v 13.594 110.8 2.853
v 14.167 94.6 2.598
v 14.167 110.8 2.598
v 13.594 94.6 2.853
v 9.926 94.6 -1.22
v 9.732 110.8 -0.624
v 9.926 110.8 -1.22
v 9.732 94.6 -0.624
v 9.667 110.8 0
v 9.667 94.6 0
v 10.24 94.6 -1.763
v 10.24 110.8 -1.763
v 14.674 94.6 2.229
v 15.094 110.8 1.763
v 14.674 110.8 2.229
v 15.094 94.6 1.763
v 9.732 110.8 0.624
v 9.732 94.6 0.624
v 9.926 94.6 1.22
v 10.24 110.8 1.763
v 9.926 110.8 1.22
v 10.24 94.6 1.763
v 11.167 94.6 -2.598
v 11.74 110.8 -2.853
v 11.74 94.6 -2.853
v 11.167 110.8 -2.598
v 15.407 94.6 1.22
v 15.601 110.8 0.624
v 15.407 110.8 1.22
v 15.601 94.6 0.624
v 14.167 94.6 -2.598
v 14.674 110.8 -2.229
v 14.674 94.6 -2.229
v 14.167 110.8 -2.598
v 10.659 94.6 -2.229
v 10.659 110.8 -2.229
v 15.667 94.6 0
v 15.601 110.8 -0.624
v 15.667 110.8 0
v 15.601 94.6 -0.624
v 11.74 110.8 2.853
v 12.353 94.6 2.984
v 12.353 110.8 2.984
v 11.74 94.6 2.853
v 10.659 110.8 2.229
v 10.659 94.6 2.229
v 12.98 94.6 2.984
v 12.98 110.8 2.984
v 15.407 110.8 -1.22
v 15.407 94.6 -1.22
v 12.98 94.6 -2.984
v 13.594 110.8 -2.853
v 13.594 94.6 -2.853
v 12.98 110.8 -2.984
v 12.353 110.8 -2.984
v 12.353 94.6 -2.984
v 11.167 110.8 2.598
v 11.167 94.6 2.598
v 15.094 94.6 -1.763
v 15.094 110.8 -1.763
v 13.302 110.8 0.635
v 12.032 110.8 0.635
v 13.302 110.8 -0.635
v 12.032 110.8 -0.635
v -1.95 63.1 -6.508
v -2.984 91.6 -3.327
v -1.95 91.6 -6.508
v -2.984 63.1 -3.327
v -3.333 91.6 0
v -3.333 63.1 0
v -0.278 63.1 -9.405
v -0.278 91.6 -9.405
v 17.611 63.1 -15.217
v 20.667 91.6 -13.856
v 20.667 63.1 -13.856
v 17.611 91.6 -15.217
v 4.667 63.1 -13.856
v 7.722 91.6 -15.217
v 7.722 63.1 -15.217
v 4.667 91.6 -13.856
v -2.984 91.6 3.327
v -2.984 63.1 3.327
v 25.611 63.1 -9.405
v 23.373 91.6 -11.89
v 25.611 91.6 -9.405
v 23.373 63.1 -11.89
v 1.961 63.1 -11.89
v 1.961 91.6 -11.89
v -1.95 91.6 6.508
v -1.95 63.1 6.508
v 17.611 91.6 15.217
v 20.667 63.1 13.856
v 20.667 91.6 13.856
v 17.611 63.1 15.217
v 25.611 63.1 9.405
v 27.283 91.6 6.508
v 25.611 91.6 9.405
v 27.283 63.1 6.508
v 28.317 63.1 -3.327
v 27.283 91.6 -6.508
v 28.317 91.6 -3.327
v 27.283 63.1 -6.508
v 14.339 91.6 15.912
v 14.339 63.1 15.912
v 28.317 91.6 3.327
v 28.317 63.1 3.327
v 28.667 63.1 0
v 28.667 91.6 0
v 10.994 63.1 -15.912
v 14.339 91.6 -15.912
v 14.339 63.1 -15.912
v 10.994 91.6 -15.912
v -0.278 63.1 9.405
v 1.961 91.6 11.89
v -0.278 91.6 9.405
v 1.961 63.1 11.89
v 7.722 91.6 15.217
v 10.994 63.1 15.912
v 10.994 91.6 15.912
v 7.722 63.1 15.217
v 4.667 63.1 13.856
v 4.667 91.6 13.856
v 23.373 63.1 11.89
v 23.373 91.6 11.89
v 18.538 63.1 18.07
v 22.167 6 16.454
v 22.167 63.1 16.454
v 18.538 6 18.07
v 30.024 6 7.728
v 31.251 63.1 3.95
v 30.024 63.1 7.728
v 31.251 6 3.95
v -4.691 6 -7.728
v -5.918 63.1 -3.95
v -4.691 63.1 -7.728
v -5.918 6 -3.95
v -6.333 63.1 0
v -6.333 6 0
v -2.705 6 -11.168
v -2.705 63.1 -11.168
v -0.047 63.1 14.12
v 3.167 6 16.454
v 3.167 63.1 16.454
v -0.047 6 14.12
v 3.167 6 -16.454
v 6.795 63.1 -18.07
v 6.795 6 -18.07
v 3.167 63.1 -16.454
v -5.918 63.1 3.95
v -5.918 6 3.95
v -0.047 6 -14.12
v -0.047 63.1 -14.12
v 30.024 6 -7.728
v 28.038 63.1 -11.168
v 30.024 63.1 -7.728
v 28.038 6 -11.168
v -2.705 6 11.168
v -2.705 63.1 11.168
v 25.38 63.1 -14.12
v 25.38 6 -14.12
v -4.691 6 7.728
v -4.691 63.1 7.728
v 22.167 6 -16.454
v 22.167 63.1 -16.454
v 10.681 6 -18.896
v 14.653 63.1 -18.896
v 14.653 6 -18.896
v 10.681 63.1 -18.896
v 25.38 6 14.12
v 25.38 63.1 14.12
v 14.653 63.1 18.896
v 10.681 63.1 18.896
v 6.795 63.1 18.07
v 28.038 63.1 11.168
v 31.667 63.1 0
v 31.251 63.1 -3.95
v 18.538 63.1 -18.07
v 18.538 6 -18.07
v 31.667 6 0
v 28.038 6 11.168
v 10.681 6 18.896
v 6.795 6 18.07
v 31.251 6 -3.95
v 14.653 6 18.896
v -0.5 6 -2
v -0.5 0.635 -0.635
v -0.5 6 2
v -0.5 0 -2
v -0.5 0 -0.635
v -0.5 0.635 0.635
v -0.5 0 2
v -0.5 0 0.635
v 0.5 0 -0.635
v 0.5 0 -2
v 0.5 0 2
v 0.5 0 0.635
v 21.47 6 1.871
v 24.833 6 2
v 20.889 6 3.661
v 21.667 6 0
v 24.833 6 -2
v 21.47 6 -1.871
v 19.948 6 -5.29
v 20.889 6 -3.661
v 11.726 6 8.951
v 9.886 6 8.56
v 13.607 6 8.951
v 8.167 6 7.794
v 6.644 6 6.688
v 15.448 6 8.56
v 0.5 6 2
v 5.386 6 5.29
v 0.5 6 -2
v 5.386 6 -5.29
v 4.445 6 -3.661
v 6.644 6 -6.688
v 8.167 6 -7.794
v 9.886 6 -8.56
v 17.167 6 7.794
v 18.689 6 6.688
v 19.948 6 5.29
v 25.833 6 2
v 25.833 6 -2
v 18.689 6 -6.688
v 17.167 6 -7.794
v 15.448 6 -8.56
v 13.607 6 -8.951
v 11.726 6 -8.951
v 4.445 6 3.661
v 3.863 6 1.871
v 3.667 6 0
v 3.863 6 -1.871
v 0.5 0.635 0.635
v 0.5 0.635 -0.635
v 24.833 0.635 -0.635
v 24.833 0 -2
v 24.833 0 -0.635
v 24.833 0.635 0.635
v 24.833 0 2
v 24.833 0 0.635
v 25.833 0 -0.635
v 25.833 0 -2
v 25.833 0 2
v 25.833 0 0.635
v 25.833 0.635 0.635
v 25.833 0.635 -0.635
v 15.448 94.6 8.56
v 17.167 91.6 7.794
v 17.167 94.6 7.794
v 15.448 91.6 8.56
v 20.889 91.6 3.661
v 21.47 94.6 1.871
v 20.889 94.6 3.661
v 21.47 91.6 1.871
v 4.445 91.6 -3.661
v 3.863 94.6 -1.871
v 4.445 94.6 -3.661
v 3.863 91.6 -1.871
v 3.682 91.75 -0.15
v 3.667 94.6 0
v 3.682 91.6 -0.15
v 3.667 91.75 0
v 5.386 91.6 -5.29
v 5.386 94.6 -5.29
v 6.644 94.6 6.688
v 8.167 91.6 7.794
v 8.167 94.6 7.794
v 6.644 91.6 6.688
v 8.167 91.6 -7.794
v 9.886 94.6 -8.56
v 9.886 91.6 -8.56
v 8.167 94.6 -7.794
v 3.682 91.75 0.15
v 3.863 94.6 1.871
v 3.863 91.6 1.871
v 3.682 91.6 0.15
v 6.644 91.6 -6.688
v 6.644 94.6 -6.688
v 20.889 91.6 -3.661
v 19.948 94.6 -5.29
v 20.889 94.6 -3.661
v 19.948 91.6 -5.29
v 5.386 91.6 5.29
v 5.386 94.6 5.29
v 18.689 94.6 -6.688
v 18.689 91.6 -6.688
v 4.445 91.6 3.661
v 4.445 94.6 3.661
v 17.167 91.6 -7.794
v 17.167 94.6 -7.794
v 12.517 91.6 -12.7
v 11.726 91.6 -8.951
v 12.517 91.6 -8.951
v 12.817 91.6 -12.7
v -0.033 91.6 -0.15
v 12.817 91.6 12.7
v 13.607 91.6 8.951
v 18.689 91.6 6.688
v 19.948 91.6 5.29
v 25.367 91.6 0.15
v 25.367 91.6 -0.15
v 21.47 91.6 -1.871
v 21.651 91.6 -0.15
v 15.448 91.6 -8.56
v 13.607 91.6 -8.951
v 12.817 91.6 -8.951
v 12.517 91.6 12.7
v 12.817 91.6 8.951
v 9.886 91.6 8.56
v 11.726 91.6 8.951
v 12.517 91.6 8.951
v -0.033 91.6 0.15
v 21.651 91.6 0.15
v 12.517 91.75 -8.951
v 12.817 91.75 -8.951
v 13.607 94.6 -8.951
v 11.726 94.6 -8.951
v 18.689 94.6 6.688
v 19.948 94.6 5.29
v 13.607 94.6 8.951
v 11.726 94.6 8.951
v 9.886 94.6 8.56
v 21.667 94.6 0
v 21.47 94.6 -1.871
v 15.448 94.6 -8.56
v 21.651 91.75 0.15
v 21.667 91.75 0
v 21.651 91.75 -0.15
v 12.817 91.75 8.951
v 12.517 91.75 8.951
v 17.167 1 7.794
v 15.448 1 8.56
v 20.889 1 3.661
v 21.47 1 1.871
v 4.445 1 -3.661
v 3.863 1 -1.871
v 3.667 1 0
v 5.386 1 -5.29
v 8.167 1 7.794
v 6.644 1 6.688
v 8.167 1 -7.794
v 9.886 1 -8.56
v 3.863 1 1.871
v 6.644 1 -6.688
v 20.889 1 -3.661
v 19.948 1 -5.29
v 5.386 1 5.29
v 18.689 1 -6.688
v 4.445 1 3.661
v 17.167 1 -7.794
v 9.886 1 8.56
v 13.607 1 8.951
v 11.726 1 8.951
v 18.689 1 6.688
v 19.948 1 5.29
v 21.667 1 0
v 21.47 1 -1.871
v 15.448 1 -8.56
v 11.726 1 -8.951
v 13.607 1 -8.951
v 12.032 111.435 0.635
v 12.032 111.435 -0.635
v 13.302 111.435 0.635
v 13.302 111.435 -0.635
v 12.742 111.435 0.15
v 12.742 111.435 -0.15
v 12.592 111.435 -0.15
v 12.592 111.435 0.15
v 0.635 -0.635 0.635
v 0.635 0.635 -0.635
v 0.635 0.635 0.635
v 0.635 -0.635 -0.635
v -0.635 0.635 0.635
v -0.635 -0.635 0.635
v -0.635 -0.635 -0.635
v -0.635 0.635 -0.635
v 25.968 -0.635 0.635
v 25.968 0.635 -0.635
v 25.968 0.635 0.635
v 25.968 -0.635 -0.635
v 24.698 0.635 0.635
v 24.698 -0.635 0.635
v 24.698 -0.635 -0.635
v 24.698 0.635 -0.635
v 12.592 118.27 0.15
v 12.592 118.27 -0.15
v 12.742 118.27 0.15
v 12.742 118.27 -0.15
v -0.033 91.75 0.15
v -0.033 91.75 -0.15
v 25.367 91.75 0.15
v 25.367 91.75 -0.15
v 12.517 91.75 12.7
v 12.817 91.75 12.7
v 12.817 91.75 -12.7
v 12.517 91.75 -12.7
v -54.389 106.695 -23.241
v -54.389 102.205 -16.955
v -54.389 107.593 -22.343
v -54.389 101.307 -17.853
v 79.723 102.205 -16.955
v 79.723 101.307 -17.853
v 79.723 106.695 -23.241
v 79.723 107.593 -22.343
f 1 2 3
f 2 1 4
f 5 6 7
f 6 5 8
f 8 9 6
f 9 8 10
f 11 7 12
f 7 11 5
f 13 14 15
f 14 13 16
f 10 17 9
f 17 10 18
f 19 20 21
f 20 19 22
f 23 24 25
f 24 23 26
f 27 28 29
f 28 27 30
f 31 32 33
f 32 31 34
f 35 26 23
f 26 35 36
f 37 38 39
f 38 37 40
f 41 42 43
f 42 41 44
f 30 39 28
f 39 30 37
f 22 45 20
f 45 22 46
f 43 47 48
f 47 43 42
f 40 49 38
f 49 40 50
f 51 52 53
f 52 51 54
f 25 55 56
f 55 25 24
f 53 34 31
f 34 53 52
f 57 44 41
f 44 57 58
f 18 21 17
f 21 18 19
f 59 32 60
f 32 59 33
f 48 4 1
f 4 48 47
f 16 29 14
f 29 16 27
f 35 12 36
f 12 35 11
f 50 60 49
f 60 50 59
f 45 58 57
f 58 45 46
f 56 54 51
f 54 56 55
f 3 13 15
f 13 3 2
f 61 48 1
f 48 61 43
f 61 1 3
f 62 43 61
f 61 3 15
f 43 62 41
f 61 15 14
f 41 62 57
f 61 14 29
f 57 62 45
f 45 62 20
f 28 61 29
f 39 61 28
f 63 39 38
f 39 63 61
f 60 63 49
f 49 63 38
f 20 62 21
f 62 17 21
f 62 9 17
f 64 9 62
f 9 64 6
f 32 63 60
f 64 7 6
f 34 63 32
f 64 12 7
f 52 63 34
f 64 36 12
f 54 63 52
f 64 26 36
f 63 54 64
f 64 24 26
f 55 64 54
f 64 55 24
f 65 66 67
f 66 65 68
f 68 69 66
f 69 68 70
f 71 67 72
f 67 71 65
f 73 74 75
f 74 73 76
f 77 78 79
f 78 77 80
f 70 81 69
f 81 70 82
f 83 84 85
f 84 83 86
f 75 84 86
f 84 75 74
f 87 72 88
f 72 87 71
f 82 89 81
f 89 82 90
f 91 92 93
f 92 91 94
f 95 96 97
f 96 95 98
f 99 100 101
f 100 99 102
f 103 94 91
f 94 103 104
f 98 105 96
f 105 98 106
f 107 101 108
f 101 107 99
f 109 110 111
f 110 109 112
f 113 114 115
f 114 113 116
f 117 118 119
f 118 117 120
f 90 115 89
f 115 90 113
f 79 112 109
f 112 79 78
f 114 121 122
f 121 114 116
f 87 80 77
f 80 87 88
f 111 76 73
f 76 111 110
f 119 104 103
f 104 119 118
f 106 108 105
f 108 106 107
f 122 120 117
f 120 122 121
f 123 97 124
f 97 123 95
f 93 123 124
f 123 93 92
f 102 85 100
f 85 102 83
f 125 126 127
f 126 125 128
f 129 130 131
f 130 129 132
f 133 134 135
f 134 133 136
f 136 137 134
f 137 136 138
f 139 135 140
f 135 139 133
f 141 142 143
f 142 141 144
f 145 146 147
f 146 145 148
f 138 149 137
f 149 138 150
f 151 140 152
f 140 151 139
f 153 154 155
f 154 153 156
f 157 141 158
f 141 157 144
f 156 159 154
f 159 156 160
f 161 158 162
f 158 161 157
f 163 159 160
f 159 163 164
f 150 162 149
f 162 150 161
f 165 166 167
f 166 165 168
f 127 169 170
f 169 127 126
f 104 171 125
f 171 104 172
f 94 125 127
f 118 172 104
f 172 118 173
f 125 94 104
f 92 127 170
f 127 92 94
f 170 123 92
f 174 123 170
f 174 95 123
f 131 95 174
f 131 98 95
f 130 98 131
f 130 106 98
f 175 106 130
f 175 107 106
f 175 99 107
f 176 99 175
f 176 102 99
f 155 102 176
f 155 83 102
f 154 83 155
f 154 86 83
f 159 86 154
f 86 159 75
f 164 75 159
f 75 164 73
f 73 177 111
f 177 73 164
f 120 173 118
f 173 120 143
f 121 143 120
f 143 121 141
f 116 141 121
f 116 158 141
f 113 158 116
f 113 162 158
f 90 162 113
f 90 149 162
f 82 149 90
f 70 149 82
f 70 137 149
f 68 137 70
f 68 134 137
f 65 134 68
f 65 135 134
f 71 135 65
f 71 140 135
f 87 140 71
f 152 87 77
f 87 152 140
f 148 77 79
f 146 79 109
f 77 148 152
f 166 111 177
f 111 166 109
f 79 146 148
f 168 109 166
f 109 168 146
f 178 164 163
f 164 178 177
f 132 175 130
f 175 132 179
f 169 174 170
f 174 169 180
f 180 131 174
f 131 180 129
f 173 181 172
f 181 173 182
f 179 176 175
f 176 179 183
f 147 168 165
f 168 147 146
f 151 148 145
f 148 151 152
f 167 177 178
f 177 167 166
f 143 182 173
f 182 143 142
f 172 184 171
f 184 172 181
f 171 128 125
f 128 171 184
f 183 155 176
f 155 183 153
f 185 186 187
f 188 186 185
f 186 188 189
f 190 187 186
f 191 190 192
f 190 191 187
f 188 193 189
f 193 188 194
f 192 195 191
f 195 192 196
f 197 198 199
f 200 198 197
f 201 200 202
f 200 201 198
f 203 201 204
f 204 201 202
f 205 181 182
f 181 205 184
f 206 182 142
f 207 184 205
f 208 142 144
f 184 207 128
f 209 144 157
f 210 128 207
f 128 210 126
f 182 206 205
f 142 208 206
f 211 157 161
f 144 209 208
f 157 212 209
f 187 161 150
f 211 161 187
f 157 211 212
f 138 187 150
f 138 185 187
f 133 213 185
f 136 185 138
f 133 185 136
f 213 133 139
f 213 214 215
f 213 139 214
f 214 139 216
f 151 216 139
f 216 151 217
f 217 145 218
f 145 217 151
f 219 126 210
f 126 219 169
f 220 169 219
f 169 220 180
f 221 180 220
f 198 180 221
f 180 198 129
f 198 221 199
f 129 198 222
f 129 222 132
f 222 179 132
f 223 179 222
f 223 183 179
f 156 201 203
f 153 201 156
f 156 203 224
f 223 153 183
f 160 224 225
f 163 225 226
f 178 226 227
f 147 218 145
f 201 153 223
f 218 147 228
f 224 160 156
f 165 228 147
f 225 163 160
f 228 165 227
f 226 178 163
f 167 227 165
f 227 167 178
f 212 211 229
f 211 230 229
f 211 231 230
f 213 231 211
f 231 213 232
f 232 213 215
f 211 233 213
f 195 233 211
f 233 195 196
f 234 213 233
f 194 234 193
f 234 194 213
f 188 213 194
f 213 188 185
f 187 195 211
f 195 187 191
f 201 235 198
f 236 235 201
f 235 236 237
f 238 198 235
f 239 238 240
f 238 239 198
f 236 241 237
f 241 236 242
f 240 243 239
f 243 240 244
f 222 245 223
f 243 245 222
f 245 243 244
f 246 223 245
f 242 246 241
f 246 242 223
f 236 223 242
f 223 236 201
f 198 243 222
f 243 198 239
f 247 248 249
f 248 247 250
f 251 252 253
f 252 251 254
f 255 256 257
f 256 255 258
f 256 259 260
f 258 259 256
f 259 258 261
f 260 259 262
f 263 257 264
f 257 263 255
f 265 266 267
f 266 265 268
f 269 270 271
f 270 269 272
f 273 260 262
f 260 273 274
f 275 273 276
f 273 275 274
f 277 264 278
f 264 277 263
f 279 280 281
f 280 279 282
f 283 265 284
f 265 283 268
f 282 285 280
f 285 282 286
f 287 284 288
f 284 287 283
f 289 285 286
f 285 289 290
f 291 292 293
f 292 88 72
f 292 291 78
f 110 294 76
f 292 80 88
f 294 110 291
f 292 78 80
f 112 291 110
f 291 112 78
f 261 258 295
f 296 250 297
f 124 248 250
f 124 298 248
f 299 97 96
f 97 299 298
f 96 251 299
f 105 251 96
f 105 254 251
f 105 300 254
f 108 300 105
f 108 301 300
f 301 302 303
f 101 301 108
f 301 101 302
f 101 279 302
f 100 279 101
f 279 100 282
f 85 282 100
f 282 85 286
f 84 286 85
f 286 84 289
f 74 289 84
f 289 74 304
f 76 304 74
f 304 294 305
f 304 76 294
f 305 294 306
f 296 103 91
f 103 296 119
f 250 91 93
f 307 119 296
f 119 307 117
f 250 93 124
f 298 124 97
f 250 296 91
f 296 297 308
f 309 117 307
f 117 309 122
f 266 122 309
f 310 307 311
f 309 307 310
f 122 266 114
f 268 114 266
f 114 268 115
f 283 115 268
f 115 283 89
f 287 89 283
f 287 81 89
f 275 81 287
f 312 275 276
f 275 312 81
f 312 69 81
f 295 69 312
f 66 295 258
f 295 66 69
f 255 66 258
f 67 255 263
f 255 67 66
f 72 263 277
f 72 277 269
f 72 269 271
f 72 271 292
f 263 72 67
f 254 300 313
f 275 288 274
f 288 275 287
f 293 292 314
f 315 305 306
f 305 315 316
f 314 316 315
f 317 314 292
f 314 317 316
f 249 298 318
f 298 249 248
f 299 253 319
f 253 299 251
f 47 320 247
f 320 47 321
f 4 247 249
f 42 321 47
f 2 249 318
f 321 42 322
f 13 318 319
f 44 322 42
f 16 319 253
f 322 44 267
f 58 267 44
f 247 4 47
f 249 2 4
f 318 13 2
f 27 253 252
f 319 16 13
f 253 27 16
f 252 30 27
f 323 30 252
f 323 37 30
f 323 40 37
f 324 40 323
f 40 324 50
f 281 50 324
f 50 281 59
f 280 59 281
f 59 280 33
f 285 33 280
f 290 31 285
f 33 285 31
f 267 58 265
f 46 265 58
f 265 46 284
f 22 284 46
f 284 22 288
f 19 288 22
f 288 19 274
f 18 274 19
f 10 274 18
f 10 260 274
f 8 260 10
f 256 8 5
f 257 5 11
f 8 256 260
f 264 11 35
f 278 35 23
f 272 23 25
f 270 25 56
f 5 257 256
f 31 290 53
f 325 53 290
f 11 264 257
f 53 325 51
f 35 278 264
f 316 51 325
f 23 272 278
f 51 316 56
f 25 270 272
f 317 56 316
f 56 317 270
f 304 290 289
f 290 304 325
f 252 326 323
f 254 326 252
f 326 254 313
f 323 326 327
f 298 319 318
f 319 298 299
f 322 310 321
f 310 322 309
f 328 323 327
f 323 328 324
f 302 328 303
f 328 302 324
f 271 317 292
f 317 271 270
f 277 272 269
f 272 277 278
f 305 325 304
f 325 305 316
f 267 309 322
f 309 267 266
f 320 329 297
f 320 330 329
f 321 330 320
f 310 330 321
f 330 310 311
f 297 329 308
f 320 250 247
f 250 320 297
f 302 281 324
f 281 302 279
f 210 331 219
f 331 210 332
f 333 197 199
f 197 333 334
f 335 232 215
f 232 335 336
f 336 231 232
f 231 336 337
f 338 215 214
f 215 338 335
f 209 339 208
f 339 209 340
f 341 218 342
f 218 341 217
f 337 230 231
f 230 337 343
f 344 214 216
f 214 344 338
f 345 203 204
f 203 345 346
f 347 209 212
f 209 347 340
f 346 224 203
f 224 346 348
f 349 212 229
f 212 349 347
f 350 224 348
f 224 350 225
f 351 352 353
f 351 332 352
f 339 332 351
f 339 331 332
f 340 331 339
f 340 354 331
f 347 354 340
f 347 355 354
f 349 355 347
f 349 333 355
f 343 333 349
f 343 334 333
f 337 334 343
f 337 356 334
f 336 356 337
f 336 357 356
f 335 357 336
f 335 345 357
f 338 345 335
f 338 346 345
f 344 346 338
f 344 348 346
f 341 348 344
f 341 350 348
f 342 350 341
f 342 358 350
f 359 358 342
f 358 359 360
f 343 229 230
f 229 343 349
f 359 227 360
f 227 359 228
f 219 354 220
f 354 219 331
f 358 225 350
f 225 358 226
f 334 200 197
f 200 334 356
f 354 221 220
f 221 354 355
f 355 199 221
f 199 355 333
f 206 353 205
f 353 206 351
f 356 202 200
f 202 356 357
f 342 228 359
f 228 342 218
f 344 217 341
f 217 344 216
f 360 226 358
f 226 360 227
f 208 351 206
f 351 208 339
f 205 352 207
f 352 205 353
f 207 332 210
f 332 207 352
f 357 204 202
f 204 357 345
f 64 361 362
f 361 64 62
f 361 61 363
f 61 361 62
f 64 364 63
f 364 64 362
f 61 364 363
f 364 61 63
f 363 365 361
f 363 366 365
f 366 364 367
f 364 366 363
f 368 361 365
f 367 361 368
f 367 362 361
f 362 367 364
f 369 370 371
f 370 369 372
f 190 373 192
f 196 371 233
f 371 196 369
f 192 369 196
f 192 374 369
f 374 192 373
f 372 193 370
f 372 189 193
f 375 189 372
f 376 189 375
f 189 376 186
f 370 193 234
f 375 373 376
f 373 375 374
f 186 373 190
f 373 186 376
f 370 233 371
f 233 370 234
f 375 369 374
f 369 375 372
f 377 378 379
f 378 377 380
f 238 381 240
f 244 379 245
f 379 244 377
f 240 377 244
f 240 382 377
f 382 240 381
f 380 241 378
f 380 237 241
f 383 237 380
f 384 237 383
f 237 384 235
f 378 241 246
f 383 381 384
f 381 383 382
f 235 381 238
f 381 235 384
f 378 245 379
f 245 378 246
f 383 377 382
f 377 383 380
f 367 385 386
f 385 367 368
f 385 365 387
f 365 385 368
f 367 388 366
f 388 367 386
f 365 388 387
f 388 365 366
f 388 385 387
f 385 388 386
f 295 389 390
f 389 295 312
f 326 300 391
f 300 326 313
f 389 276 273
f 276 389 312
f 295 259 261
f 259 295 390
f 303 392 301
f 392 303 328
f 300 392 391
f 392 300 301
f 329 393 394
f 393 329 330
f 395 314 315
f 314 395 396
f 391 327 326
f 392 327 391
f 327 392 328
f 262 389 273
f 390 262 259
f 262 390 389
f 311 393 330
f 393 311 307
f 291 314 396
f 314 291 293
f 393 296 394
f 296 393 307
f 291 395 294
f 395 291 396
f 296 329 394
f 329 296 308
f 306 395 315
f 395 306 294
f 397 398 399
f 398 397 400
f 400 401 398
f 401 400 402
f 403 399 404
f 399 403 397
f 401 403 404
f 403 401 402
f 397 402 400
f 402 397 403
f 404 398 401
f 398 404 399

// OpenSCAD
include <../mo/mo.scad>

motorShaftDepth = 19.2;
motorShaftDiameter = 6;
motorGearShoulderDepth = 3;
motorGearShoulderDiameter = 18;
motorGearCapDepth = 4;
motorGearCapDiameter = 32;
motorGearDepth = 20.5;
motorGearDiameter = 32;
motorMotorDepth = 52.1;
motorMotorDiameter = 38;
motorMotorCapDepth = 5;
motorMotorCapDiameter = 38;
motorMotorEndCapDepth = 5;
motorMotorEndCapDiameter = 18;
motorConnectorDepth = 6;
motorConnectorWidth = 1;
motorConnectorHeight = 4;
motorBodyLength = 2*motorGearCapDepth+motorGearDepth+motorMotorDepth+motorMotorCapDepth+motorConnectorDepth;

positions = [
  [ [ 0, 0, 0 ], [ 0, 0, 1 ], 0 ],
  [ [ 0, -motorShaftDepth, 0 ], [ 0, 0, 1 ], 0 ],
  [ [ motorMotorDiameter/3, motorBodyLength, 0 ], [ 0, 0, 1 ], 180 ],
  [ [ -motorMotorDiameter/3, motorBodyLength, 0 ], [ 0, 0, 1 ], 180 ],
];

module actPlanetaryGearMotorHDPrecision( p = 0, info = false ) {
  moPresent( positions, p, info )
    rotate( [-90,0,0] ){
      color( Steel ) {
        translate([0,0,-motorShaftDepth/2])
          cylinder( h = motorShaftDepth, r = motorShaftDiameter/2, center = true  );
        translate([0,0,motorGearCapDepth+motorGearDepth/2])
          cylinder( h = motorGearDepth, r = motorGearDiameter/2, center = true  );
        translate([0,0,2*motorGearCapDepth+motorGearDepth+motorMotorDepth/2])
          cylinder( h = motorMotorDepth, r = motorMotorDiameter/2, center = true  );
        translate([motorMotorDiameter/3,0,2*motorGearCapDepth+motorGearDepth+motorMotorDepth+motorMotorCapDepth+motorConnectorDepth/2])
          cube( [ motorConnectorWidth, motorConnectorHeight, motorConnectorDepth ], center = true  );
        translate([-motorMotorDiameter/3,0,2*motorGearCapDepth+motorGearDepth+motorMotorDepth+motorMotorCapDepth+motorConnectorDepth/2])
          cube( [ motorConnectorWidth, motorConnectorHeight, motorConnectorDepth ], center = true  );
      }
      color( [0.4,0.4,0.4] ){
        translate([0,0,-motorGearShoulderDepth/2])
          cylinder( h = motorGearShoulderDepth, r = motorGearShoulderDiameter/2, center = true  );
        translate([0,0,motorGearCapDepth/2])
          cylinder( h = motorGearCapDepth, r = motorGearCapDiameter/2, center = true  );
        translate([0,0,motorGearCapDepth+motorGearDepth+motorGearCapDepth/2])
          cylinder( h = motorGearCapDepth, r = motorGearCapDiameter/2, center = true );
      }
      color( [0.15,0.15,0.55] ) {
        translate([0,0,2*motorGearCapDepth+motorGearDepth+motorMotorDepth+motorMotorCapDepth+motorMotorEndCapDepth/2])
          cylinder( h = motorMotorEndCapDepth, r = motorMotorEndCapDiameter/2, center = true  );
        translate([0,0,2*motorGearCapDepth+motorGearDepth+motorMotorDepth+motorMotorCapDepth/2])
          cylinder( h = motorMotorCapDepth, r = motorMotorCapDiameter/2, center = true );
      }
   }
}

function actPlanetaryGearMotorHDPrecisionPosition( p = 0 ) = positions[ p ];

moMoveOriginTo( actPlanetaryGearMotorHDPrecisionPosition( 2 ) )
  actPlanetaryGearMotorHDPrecision( 0, info = true, $name = true );
